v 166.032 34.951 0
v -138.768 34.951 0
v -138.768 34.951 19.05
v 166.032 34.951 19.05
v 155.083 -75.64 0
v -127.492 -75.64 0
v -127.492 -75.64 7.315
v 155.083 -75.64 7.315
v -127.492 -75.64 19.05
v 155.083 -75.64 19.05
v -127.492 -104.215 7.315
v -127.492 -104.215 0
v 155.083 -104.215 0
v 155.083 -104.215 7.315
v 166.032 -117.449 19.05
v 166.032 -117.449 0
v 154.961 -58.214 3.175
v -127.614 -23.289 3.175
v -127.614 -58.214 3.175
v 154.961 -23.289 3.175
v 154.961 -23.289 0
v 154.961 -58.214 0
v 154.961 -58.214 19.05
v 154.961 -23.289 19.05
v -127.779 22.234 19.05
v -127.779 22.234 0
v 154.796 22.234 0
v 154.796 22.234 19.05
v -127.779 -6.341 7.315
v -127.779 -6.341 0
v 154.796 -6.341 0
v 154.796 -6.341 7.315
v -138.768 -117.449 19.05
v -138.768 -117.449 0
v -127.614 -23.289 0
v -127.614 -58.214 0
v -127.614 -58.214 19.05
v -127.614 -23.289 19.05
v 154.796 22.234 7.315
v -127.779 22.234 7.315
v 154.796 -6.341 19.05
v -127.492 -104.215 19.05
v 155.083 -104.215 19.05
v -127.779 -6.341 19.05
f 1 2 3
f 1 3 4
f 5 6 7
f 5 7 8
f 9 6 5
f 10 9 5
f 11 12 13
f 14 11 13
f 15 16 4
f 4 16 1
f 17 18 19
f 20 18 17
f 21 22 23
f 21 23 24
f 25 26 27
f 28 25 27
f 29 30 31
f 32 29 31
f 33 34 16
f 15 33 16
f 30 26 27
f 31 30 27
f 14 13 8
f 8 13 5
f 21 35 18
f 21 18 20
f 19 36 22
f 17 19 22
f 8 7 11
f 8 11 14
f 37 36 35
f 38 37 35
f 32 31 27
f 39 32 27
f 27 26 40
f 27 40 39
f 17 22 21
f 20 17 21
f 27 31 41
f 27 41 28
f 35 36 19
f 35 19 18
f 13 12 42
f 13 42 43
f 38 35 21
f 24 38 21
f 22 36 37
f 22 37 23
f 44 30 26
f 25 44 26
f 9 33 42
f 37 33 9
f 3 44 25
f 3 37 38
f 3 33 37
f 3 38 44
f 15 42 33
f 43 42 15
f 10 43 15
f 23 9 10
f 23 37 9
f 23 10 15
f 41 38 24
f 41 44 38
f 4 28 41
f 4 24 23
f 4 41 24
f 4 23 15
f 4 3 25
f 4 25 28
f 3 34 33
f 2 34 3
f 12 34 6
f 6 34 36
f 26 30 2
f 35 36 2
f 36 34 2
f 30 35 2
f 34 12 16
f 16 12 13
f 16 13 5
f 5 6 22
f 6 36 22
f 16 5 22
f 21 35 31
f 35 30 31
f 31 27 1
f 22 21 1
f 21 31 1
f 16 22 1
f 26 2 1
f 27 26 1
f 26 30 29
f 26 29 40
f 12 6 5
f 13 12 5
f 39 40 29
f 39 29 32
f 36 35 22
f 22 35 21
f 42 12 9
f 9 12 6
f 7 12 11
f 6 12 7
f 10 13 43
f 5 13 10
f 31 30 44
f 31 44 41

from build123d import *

# Parameters (mm, degrees)
F0_W     = 282.575
F0_H     = 28.575
F1_DEPTH = 7.3152
F0_H_2   = 34.925
F2_DEPTH = 3.175
F0_W_2   = 304.8
F0_H_3   = 152.4
F3_DEPTH = 19.05


with BuildPart() as f1:
    # F0 (on Top) → F1 (new body)
    with BuildSketch(Plane.XY):
        with Locations((13.795514, -89.927282)):
            Rectangle(F0_W, F0_H)
        with Locations((13.508268, 7.946121)):
            Rectangle(F0_W, F0_H)
    extrude(amount=F1_DEPTH)


with BuildPart() as f2:
    # F0 (on Top) → F2 (new body)
    with BuildSketch(Plane.XY):
        with Locations((13.673276, -40.751064)):
            Rectangle(F0_W, F0_H_2)
    extrude(amount=F2_DEPTH)


with BuildPart() as f3:
    # F0 (on Top) → F3 (new body)
    with BuildSketch(Plane.XY):
        with Locations((13.631912, -41.248978)):
            Rectangle(F0_W_2, F0_H_3)
        with Locations((13.795514, -89.927282)):
            Rectangle(F0_W, F0_H, mode=Mode.SUBTRACT)
        with Locations((13.508268, 7.946121)):
            Rectangle(F0_W, F0_H, mode=Mode.SUBTRACT)
        with Locations((13.673276, -40.751064)):
            Rectangle(F0_W, F0_H_2, mode=Mode.SUBTRACT)
    extrude(amount=F3_DEPTH)


solid = Compound([f1.part, f2.part, f3.part])
